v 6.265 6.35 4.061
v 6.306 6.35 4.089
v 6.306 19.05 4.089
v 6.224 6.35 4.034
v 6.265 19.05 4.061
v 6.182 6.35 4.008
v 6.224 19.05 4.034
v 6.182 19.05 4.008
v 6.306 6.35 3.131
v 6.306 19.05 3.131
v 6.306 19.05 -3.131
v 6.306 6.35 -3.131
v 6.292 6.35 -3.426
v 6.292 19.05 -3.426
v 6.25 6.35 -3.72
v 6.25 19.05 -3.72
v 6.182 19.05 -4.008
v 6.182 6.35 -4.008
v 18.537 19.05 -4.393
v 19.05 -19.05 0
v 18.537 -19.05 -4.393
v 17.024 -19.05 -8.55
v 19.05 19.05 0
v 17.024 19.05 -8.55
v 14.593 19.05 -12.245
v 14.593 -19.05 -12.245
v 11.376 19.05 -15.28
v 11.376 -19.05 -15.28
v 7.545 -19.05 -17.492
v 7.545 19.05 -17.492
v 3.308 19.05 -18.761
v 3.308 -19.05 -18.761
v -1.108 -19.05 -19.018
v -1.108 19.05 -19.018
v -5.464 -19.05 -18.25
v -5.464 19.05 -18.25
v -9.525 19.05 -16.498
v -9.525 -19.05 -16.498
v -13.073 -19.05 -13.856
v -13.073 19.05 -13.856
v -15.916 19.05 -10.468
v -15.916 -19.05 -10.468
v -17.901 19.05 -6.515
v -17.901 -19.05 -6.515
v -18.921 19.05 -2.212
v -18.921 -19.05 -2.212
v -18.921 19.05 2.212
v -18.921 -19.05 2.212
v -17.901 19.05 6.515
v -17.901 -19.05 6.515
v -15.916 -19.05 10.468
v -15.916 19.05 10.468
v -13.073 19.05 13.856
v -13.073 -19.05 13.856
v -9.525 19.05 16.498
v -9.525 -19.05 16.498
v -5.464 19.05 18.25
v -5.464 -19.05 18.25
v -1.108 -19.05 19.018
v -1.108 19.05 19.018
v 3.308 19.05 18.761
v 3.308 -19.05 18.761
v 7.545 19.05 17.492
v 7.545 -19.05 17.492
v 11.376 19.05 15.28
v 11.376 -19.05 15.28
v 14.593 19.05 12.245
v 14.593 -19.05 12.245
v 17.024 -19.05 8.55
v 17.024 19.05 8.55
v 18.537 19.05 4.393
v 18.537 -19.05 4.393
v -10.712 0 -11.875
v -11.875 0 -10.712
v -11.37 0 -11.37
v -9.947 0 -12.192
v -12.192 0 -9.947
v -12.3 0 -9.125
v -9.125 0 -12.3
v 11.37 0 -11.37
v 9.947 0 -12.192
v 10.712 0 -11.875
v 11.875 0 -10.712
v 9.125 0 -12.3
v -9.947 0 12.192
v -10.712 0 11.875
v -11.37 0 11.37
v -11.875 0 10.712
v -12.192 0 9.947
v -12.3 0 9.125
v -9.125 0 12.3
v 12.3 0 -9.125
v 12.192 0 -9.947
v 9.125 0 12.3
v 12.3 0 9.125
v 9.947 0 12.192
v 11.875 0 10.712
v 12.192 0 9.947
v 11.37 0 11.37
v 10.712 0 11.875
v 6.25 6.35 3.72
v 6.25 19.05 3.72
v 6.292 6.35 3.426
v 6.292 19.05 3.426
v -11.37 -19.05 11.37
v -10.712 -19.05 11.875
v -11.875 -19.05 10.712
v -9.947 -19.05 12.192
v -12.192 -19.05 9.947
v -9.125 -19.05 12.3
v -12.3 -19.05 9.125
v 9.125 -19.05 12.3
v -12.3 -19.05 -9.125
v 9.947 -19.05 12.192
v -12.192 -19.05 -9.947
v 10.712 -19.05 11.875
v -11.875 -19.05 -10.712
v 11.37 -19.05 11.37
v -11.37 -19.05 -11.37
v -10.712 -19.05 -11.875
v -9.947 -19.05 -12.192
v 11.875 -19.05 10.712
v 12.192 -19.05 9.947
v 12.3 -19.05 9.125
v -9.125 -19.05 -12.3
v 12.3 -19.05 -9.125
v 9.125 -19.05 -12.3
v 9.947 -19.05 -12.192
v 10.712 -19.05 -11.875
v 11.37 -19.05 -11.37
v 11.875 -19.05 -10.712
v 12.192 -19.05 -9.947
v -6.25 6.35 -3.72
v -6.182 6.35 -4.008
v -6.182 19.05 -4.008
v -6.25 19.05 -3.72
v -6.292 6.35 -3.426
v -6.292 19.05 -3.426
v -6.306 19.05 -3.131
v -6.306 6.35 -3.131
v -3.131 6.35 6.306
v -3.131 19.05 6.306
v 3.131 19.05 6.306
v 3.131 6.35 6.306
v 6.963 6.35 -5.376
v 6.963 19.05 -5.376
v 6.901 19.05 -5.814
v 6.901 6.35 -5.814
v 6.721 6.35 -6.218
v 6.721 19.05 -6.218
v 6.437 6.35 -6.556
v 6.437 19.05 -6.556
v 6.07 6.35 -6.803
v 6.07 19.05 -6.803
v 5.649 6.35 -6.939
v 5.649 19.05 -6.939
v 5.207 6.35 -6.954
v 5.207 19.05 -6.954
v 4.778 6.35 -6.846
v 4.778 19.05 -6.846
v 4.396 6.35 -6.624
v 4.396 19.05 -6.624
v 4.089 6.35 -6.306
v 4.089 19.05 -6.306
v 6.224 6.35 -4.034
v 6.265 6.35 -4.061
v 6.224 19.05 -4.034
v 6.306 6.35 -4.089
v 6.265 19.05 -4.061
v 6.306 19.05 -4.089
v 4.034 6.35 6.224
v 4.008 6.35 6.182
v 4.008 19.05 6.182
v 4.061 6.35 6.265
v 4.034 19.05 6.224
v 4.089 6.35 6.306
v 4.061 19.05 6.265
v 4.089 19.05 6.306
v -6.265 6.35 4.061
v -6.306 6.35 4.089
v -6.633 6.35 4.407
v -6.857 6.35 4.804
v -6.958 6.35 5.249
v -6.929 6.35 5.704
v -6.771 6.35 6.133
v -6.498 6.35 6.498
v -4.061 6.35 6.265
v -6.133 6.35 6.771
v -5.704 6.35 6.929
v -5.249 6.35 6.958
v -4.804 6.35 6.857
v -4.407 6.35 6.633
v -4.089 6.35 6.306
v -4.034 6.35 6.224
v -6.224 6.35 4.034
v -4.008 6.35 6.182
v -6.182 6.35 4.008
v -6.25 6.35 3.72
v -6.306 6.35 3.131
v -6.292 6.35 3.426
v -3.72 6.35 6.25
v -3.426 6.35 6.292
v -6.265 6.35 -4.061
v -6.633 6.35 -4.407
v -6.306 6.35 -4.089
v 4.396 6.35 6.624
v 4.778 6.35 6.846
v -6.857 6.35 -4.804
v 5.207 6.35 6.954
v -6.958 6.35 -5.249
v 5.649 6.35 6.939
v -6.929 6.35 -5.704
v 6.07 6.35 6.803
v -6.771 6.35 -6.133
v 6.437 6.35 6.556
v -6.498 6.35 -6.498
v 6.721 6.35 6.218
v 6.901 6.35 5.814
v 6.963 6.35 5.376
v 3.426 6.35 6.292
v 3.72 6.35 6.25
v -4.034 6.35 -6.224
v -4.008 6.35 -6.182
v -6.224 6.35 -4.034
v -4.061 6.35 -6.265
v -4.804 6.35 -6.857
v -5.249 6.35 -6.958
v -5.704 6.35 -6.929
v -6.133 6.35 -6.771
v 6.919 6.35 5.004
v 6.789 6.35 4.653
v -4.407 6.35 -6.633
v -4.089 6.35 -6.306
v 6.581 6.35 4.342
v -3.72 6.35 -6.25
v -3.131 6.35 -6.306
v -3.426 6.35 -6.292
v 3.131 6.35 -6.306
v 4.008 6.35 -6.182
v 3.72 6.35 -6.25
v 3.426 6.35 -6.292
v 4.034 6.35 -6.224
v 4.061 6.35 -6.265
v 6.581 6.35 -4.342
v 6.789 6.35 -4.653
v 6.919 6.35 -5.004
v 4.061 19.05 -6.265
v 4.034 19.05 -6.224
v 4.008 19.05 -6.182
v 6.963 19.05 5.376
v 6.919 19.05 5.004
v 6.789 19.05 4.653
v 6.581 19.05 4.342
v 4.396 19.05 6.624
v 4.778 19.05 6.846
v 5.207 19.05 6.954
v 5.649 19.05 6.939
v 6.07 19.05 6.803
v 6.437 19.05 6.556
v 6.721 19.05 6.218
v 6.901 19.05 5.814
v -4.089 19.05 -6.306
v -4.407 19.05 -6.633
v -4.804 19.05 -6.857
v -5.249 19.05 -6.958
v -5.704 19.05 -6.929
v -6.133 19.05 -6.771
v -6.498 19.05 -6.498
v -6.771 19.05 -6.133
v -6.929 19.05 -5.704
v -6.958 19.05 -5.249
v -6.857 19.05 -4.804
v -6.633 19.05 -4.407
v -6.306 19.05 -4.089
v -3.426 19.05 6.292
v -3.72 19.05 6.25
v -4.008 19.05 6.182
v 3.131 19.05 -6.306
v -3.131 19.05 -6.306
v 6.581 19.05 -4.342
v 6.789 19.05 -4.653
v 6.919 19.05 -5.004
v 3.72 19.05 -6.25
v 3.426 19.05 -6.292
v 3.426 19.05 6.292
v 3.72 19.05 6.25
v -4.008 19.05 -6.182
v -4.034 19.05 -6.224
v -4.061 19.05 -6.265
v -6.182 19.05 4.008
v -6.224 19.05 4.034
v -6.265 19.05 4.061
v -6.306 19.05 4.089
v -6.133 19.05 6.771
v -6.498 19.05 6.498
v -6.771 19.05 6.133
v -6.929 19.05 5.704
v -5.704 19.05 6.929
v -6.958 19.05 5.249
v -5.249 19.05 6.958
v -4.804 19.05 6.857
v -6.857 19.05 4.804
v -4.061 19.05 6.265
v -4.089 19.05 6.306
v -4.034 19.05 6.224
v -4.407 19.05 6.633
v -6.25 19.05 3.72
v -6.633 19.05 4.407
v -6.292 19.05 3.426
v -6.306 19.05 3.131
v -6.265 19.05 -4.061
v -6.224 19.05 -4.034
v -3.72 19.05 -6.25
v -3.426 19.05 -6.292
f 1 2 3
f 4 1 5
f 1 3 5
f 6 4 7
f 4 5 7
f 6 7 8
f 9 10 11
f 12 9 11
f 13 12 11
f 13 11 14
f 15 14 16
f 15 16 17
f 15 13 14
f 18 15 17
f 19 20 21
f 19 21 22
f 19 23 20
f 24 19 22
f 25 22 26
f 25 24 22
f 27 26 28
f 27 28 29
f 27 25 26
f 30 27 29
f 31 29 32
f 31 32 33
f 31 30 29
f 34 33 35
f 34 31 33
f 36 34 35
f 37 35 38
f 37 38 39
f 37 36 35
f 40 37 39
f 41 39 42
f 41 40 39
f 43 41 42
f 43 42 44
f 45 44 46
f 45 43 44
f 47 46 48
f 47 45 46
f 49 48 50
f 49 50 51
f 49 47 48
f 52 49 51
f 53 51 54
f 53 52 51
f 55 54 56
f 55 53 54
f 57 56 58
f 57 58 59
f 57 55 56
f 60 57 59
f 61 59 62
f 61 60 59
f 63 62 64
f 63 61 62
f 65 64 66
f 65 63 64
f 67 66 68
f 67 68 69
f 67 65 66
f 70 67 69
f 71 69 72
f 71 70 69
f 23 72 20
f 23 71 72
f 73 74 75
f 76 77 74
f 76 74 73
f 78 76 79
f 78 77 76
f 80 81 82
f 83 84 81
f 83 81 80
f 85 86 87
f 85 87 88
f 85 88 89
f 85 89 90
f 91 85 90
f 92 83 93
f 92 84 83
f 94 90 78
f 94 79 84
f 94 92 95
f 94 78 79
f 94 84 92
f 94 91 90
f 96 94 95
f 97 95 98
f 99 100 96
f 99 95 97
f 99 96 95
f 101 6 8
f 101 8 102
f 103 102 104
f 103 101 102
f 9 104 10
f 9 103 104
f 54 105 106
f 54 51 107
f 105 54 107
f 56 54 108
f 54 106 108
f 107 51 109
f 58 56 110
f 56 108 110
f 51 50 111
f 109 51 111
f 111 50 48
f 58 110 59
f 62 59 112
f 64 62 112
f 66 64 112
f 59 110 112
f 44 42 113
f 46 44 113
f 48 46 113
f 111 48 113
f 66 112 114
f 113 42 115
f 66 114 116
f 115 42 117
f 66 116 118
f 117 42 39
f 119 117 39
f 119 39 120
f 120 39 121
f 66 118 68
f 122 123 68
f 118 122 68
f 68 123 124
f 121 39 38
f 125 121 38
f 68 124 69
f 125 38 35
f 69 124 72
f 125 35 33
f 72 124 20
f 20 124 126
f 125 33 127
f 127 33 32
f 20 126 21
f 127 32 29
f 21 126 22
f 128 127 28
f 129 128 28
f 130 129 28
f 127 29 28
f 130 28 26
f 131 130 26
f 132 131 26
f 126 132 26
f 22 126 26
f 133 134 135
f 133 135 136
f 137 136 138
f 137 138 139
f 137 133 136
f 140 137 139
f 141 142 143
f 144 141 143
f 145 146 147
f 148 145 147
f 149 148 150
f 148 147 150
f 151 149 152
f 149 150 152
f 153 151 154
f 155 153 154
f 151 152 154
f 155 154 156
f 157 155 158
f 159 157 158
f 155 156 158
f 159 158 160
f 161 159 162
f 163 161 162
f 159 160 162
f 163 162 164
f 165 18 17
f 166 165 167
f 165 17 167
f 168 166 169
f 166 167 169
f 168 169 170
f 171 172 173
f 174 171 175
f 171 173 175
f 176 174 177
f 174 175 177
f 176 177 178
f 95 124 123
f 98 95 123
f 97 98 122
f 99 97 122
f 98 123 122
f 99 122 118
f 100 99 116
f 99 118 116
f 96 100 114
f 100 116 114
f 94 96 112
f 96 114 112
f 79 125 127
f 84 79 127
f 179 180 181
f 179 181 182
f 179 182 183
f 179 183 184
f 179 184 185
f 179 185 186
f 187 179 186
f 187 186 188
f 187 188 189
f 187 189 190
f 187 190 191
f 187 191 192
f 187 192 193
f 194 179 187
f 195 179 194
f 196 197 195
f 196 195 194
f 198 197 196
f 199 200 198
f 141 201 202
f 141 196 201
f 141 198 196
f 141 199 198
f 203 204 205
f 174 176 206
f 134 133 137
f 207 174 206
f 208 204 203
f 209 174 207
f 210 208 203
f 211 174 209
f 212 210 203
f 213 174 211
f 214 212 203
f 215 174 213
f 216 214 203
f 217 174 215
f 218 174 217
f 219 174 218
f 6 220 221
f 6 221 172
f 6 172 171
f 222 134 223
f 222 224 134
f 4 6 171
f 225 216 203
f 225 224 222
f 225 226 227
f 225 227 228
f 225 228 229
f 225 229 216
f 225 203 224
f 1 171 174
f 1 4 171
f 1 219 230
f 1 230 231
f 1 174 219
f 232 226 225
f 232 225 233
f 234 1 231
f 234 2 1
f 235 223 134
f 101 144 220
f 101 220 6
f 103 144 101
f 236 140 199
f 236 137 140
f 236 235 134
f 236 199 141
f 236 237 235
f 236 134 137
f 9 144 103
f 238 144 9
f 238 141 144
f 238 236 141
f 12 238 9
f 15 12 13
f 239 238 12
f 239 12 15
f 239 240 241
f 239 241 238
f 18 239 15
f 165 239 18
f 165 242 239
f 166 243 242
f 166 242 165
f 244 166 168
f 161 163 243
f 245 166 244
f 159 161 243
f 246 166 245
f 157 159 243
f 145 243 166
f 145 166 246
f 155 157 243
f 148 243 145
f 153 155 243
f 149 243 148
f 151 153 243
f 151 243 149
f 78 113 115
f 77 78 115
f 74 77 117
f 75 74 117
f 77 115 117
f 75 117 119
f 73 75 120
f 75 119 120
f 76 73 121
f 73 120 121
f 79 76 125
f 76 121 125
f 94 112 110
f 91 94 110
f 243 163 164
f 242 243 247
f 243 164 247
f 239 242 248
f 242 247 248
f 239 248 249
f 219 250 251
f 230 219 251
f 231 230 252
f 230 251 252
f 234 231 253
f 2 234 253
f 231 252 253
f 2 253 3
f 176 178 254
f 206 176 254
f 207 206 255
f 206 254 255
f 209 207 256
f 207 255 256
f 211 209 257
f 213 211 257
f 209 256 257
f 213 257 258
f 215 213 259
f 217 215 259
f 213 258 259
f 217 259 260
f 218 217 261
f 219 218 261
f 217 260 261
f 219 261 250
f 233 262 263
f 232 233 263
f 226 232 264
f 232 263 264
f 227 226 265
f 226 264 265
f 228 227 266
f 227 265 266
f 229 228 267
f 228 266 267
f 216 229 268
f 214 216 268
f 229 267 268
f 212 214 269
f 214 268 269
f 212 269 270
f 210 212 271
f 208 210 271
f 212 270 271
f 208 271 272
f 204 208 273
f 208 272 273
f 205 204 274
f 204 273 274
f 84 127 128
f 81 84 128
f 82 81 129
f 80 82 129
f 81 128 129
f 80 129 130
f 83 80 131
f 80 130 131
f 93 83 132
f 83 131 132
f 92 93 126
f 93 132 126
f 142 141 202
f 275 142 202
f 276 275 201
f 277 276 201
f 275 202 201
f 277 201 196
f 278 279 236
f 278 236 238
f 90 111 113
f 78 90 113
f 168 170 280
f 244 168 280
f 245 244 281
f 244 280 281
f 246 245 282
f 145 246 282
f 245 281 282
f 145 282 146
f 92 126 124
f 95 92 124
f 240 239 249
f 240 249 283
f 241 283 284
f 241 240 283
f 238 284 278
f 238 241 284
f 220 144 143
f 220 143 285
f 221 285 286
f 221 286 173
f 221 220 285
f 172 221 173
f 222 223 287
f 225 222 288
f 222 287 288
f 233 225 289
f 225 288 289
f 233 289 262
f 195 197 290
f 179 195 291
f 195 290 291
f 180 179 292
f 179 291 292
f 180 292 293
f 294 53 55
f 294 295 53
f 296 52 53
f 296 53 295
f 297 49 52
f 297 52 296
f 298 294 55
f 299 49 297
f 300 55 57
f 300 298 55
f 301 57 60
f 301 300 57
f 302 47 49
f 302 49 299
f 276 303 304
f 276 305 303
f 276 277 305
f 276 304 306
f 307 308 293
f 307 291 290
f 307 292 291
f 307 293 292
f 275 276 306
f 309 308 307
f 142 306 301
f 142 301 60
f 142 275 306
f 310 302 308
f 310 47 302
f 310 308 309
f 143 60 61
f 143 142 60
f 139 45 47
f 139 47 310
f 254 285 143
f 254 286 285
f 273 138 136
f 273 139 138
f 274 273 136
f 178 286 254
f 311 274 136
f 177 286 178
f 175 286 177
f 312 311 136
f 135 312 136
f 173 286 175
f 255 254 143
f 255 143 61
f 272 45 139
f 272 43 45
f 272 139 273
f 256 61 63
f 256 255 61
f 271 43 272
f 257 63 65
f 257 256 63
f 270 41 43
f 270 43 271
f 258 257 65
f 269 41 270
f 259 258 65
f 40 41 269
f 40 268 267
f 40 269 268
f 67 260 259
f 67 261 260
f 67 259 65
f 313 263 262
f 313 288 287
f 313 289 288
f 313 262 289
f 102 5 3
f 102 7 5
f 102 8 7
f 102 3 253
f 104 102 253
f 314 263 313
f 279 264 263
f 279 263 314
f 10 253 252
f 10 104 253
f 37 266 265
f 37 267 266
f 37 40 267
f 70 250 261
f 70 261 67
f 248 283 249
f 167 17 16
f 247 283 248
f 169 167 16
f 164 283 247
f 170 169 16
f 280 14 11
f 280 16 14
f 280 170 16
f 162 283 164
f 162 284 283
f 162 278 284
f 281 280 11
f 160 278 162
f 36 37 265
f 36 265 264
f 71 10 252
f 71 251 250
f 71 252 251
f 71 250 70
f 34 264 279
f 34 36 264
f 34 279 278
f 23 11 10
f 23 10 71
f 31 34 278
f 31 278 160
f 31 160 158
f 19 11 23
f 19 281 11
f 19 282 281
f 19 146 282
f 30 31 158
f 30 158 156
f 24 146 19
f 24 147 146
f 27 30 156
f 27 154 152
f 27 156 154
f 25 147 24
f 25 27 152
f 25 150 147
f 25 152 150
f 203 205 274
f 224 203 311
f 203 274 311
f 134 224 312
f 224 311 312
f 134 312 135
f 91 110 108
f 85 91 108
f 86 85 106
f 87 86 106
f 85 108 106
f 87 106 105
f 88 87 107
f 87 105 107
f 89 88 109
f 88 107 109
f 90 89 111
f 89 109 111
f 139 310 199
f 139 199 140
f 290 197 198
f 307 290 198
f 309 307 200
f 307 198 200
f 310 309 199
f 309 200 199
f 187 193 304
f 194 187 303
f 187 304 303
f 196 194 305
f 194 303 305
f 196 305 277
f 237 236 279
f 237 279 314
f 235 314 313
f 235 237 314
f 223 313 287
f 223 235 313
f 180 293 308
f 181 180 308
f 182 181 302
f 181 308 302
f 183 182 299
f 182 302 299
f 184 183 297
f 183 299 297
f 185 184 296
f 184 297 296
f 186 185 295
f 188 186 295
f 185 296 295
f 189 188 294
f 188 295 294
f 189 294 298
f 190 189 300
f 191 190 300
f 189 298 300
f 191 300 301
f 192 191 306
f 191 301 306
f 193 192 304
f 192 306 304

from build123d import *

# Parameters (mm, degrees)
SKETCH1_R           = 19.05
BOSS_EXTRUDE1_DEPTH = 19.05
SKETCH2_W           = 12.6111
SKETCH2_H           = 12.6111
CUT_EXTRUDE1_DEPTH  = 12.7
CUT_EXTRUDE2_DEPTH  = 19.05
FILLET1_R           = 3.175
CUT_EXTRUDE3_DEPTH  = 12.7


with BuildPart() as part:
    # Sketch1 → Boss-Extrude1 (new body, symmetric)
    with BuildSketch(Plane(origin=(0, 0, 0), x_dir=(1, 0, 0), z_dir=(0, 1, 0))):
        Circle(SKETCH1_R)
    extrude(amount=BOSS_EXTRUDE1_DEPTH, both=True)

    # Sketch2 → Cut-Extrude1 (cut)
    with BuildSketch(Plane(origin=(0, 19.05, 0), x_dir=(1, 0, 0), z_dir=(0, 1, 0))):
        Rectangle(SKETCH2_W, SKETCH2_H)
    extrude(amount=-CUT_EXTRUDE1_DEPTH, mode=Mode.SUBTRACT)

    # Sketch3 → Cut-Extrude2 (cut)
    with BuildSketch(Plane.XZ.offset(19.05)):
        with BuildLine():
            Line((9.12495, 12.29995), (-9.12495, 12.29995))
            ThreePointArc((-9.12495, 12.29995), (-11.37001403, 11.37001403), (-12.29995, 9.12495))
            Line((-12.29995, 9.12495), (-12.29995, -9.12495))
            ThreePointArc((-12.29995, -9.12495), (-11.37001403, -11.37001403), (-9.12495, -12.29995))
            Line((-9.12495, -12.29995), (9.12495, -12.29995))
            ThreePointArc((9.12495, -12.29995), (11.37001403, -11.37001403), (12.29995, -9.12495))
            Line((12.29995, -9.12495), (12.29995, 9.12495))
            ThreePointArc((12.29995, 9.12495), (11.37001403, 11.37001403), (9.12495, 12.29995))
        make_face()
    extrude(amount=-CUT_EXTRUDE2_DEPTH, mode=Mode.SUBTRACT)

    # Fillet1
    fillet1_edges = [part.edges().sort_by_distance(p)[0] for p in [
        (-6.30555, 12.7, 6.30555),
        (-6.30555, 12.7, -6.30555),
        (6.30555, 12.7, -6.30555),
        (6.30555, 12.7, 6.30555),
    ]]
    fillet(fillet1_edges, radius=FILLET1_R)

    # Sketch4 → Cut-Extrude3 (cut)
    with BuildSketch(Plane(origin=(0, 19.05, 0), x_dir=(1, 0, 0), z_dir=(0, 1, 0))):
        with BuildLine():
            ThreePointArc((4.008094076, 6.181867977), (4.253082015, 4.253082015), (6.181867977, 4.008094076))
            ThreePointArc((6.181867977, 4.008094076), (5.37561403, 5.37561403), (4.008094076, 6.181867977))
        make_face()
        with BuildLine():
            ThreePointArc((6.181867977, 4.008094076), (6.244651028, 4.047106994), (6.30555, 4.089000125))
            Line((6.30555, 4.089000125), (6.30555, 6.30555))
            Line((6.30555, 6.30555), (4.089000125, 6.30555))
            ThreePointArc((4.089000125, 6.30555), (4.047106994, 6.244651028), (4.008094076, 6.181867977))
            ThreePointArc((4.008094076, 6.181867977), (5.37561403, 5.37561403), (6.181867977, 4.008094076))
        make_face()
        with BuildLine():
            Line((6.30555, 6.30555), (6.30555, 4.089000125))
            ThreePointArc((6.30555, 4.089000125), (6.789196289, 4.653158877), (6.96311403, 5.37561403))
            ThreePointArc((6.96311403, 5.37561403), (5.864314693, 6.886020569), (4.089000125, 6.30555))
            Line((4.089000125, 6.30555), (6.30555, 6.30555))
        make_face()
        with BuildLine():
            ThreePointArc((-4.008094076, 6.181867977), (-5.37561403, 5.37561403), (-6.181867977, 4.008094076))
            ThreePointArc((-6.181867977, 4.008094076), (-4.588140821, 3.997193849), (-3.78811403, 5.37561403))
            ThreePointArc((-3.78811403, 5.37561403), (-3.844096127, 5.793476641), (-4.008094076, 6.181867977))
        make_face()
        with BuildLine():
            Line((-6.30555, 6.30555), (-6.30555, 4.089000125))
            ThreePointArc((-6.30555, 4.089000125), (-6.244651028, 4.047106994), (-6.181867977, 4.008094076))
            ThreePointArc((-6.181867977, 4.008094076), (-5.37561403, 5.37561403), (-4.008094076, 6.181867977))
            ThreePointArc((-4.008094076, 6.181867977), (-4.047106994, 6.244651028), (-4.089000125, 6.30555))
            Line((-4.089000125, 6.30555), (-6.30555, 6.30555))
        make_face()
        with BuildLine():
            ThreePointArc((-4.089000125, 6.30555), (-6.498146045, 6.498146045), (-6.30555, 4.089000125))
            Line((-6.30555, 4.089000125), (-6.30555, 6.30555))
            Line((-6.30555, 6.30555), (-4.089000125, 6.30555))
        make_face()
        with BuildLine():
            ThreePointArc((-6.30555, -4.089000125), (-6.498146045, -6.498146045), (-4.089000125, -6.30555))
            Line((-4.089000125, -6.30555), (-6.30555, -6.30555))
            Line((-6.30555, -6.30555), (-6.30555, -4.089000125))
        make_face()
        with BuildLine():
            Line((-6.30555, -6.30555), (-4.089000125, -6.30555))
            ThreePointArc((-4.089000125, -6.30555), (-4.047106994, -6.244651028), (-4.008094076, -6.181867977))
            ThreePointArc((-4.008094076, -6.181867977), (-5.37561403, -5.37561403), (-6.181867977, -4.008094076))
            ThreePointArc((-6.181867977, -4.008094076), (-6.244651028, -4.047106994), (-6.30555, -4.089000125))
            Line((-6.30555, -4.089000125), (-6.30555, -6.30555))
        make_face()
        with BuildLine():
            ThreePointArc((-6.181867977, -4.008094076), (-5.37561403, -5.37561403), (-4.008094076, -6.181867977))
            ThreePointArc((-4.008094076, -6.181867977), (-3.844096127, -5.793476641), (-3.78811403, -5.37561403))
            ThreePointArc((-3.78811403, -5.37561403), (-4.588140821, -3.997193849), (-6.181867977, -4.008094076))
        make_face()
        with BuildLine():
            ThreePointArc((6.181867977, -4.008094076), (4.253082015, -4.253082015), (4.008094076, -6.181867977))
            ThreePointArc((4.008094076, -6.181867977), (5.37561403, -5.37561403), (6.181867977, -4.008094076))
        make_face()
        with BuildLine():
            ThreePointArc((4.008094076, -6.181867977), (4.047106994, -6.244651028), (4.089000125, -6.30555))
            Line((4.089000125, -6.30555), (6.30555, -6.30555))
            Line((6.30555, -6.30555), (6.30555, -4.089000125))
            ThreePointArc((6.30555, -4.089000125), (6.244651028, -4.047106994), (6.181867977, -4.008094076))
            ThreePointArc((6.181867977, -4.008094076), (5.37561403, -5.37561403), (4.008094076, -6.181867977))
        make_face()
        with BuildLine():
            Line((6.30555, -6.30555), (4.089000125, -6.30555))
            ThreePointArc((4.089000125, -6.30555), (5.864314693, -6.886020569), (6.96311403, -5.37561403))
            ThreePointArc((6.96311403, -5.37561403), (6.789196289, -4.653158877), (6.30555, -4.089000125))
            Line((6.30555, -4.089000125), (6.30555, -6.30555))
        make_face()
    extrude(amount=-CUT_EXTRUDE3_DEPTH, mode=Mode.SUBTRACT)


solid = part.part
